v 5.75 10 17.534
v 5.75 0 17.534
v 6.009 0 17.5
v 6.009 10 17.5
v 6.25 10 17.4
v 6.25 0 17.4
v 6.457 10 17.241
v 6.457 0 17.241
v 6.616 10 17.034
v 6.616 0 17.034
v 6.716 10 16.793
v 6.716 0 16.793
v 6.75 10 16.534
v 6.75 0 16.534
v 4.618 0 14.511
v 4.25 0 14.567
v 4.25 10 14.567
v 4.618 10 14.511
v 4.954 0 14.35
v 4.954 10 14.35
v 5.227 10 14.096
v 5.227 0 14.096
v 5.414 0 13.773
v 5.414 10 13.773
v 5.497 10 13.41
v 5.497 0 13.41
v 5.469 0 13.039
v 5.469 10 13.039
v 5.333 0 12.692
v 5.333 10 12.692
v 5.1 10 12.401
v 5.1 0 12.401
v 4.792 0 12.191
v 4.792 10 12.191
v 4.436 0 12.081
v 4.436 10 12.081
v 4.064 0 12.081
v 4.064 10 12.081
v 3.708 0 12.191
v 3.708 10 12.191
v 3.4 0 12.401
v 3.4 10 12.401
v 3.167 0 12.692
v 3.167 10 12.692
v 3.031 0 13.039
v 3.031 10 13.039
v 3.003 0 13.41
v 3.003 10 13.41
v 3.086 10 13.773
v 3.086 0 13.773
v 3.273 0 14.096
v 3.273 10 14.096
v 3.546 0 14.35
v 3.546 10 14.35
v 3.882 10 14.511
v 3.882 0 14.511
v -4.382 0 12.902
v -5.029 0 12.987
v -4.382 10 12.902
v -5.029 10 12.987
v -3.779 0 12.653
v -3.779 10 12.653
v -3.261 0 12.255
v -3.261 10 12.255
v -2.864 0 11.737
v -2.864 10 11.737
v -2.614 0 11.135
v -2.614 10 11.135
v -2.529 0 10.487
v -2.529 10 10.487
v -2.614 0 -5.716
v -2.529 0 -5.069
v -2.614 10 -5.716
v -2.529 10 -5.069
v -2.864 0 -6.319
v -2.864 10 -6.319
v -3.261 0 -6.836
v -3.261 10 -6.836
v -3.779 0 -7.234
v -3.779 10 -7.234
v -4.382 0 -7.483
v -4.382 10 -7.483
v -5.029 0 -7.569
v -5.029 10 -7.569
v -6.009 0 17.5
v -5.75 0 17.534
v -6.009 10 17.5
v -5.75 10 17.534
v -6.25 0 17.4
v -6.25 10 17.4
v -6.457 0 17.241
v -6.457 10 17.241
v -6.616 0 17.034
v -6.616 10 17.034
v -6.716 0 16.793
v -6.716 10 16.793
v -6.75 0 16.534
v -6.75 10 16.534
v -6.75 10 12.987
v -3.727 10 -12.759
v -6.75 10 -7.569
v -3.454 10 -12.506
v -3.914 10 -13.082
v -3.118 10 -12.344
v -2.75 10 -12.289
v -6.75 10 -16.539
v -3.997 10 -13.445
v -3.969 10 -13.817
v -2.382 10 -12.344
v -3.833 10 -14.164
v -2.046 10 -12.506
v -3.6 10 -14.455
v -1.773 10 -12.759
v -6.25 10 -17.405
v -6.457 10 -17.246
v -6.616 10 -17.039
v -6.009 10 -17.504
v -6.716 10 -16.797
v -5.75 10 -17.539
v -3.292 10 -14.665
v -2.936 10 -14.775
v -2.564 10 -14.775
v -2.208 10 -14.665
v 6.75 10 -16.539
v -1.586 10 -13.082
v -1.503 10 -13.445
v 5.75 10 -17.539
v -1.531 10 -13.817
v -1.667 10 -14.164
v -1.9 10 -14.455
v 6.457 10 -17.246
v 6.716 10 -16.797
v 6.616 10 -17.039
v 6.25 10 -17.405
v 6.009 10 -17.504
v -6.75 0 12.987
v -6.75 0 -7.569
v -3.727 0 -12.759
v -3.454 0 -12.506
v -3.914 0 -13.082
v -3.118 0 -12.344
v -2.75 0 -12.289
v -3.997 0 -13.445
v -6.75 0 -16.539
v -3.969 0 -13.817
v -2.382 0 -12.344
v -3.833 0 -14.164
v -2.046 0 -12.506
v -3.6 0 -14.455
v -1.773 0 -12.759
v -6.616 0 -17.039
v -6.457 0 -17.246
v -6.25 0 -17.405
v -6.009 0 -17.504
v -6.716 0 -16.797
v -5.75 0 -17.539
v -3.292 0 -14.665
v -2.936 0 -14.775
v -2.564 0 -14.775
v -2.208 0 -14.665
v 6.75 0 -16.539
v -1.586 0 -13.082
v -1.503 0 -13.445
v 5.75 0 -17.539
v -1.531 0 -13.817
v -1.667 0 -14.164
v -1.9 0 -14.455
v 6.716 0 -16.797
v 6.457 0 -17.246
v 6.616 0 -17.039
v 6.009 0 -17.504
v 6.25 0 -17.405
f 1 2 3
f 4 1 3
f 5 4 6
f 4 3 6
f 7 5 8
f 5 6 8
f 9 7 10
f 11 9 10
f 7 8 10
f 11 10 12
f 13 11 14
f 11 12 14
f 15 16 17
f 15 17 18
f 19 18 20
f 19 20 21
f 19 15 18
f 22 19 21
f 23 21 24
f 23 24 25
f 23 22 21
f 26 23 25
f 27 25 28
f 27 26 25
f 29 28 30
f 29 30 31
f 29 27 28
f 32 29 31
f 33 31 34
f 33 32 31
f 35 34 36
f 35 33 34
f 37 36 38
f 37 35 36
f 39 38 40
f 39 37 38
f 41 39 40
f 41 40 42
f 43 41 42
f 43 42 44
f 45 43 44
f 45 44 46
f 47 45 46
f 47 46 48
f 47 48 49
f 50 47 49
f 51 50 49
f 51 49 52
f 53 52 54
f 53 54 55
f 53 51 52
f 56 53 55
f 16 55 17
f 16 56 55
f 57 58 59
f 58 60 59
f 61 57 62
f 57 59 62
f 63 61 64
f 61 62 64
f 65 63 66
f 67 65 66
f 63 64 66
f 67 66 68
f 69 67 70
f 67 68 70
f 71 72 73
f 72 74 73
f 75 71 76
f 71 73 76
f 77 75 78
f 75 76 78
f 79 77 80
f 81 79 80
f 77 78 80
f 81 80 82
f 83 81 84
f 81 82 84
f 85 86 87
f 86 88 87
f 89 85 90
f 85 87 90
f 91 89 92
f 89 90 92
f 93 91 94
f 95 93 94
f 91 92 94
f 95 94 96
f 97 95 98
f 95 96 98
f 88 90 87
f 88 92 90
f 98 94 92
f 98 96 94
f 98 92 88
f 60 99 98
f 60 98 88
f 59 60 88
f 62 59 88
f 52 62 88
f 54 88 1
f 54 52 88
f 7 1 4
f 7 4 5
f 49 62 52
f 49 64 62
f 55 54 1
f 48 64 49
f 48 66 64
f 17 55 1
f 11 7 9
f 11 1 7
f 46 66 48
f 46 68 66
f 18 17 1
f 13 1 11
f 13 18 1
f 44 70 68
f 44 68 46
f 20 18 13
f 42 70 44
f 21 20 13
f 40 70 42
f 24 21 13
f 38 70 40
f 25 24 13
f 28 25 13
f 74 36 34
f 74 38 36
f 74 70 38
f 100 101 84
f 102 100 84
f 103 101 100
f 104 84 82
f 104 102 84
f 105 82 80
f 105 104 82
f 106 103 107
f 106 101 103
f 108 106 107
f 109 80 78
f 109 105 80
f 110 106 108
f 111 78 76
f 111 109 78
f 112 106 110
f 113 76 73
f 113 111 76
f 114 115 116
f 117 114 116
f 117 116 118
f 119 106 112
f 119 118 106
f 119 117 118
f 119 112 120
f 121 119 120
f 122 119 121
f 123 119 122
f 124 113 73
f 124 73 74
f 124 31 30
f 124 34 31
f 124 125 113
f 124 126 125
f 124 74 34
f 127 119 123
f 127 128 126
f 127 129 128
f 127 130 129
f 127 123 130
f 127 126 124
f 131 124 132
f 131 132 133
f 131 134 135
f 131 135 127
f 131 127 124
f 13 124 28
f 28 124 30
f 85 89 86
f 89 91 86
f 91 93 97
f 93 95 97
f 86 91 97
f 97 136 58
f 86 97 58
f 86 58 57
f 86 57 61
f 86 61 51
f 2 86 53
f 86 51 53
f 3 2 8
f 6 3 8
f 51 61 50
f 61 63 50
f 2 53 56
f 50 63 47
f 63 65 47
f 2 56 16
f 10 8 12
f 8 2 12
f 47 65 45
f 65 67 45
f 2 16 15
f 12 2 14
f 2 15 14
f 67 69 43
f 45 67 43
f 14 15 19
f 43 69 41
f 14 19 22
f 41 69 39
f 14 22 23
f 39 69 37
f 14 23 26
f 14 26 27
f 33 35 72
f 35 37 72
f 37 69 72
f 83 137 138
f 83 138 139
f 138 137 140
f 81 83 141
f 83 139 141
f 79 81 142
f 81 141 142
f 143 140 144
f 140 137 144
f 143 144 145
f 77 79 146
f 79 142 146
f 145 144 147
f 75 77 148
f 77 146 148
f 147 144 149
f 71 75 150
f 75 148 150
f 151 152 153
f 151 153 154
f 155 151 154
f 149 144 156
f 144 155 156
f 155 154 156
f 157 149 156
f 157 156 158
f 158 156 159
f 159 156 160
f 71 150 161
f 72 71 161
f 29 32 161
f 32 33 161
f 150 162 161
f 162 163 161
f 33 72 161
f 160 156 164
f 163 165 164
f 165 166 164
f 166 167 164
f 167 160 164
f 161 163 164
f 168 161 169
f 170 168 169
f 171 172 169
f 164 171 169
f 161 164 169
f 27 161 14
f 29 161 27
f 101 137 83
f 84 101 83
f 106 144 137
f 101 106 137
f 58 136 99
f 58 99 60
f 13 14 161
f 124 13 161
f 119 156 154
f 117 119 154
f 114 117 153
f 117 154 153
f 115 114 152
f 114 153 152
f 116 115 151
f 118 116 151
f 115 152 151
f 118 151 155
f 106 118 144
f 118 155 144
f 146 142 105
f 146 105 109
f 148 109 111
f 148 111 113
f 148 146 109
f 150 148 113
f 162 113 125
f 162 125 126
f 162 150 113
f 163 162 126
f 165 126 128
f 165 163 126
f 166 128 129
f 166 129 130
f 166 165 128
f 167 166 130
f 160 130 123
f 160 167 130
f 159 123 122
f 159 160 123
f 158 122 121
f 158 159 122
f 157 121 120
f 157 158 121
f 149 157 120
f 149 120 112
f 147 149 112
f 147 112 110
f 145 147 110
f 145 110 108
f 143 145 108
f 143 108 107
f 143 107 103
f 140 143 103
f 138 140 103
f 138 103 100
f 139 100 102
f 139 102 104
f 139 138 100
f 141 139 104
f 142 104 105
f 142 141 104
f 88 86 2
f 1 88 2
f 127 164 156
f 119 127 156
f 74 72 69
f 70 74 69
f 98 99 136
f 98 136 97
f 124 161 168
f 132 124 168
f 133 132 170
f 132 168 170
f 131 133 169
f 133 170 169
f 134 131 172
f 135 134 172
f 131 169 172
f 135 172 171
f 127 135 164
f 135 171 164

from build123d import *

# Parameters (mm, degrees)
SKETCH_1_R         = 1.25
EXTRUDE_2_DEPTH    = 10
SKETCH1_W          = 5.221315892
SKETCH1_H          = 20.556
CUT_EXTRUDE1_DEPTH = 10
FILLET1_R          = 1
FILLET2_R          = 2.5


with BuildPart() as part:
    # Эскиз1 → Бобышка-Вытянуть2 (new body)
    with BuildSketch(Plane(origin=(0, 0, 0), x_dir=(1, 0, 0), z_dir=(0, 1, 0))):
        with BuildLine():
            Line((-6.75, -16.533718228), (-6.75, -17.533718228))
            Line((-6.75, -17.533718228), (1.25, -17.533718228))
            Line((1.25, -17.533718228), (5.75, -17.533718228))
            ThreePointArc((5.75, -17.533718228), (6.457106781, -17.240825009), (6.75, -16.533718228))
            Line((6.75, -16.533718228), (6.75, 16.538507887))
            ThreePointArc((6.75, 16.538507887), (6.457106781, 17.245614668), (5.75, 17.538507887))
            Line((5.75, 17.538507887), (-5.75, 17.538507887))
            ThreePointArc((-5.75, 17.538507887), (-6.457106781, 17.245614668), (-6.75, 16.538507887))
            Line((-6.75, 16.538507887), (-6.75, 5.538507887))
            ThreePointArc((-6.75, 5.538507887), (-6.457106781, 4.831401106), (-5.75, 4.538507887))
            Line((-5.75, 4.538507887), (-5.746697715, 4.538507887))
            ThreePointArc((-5.746697715, 4.538507887), (-5.039590934, 4.245614668), (-4.746697715, 3.538507887))
            Line((-4.746697715, 3.538507887), (-4.746697715, -8.461492113))
            ThreePointArc((-4.746697715, -8.461492113), (-5.039590934, -9.168598894), (-5.746697715, -9.461492113))
            Line((-5.746697715, -9.461492113), (-5.75, -9.461492113))
            ThreePointArc((-5.75, -9.461492113), (-6.457106781, -9.754385332), (-6.75, -10.461492113))
            Line((-6.75, -10.461492113), (-6.75, -16.533718228))
        make_face()
        with Locations(Location((-2.75, 13.538507887, 0), (0, 0, 270))):
            Circle(SKETCH_1_R, mode=Mode.SUBTRACT)
        with Locations(Location((4.25, -13.316820051, 0), (0, 0, 270))):
            Circle(SKETCH_1_R, mode=Mode.SUBTRACT)
    extrude(amount=EXTRUDE_2_DEPTH)

    # Sketch1 → Cut-Extrude1 (cut)
    with BuildSketch(Plane.XZ):
        with Locations((-5.139342054, 2.709492113)):
            Rectangle(SKETCH1_W, SKETCH1_H)
    extrude(amount=-CUT_EXTRUDE1_DEPTH, mode=Mode.SUBTRACT)

    # Fillet1
    fillet1_edges = [part.edges().sort_by_distance(p)[0] for p in [
        (-6.75, 5, 17.533718228),
    ]]
    fillet(fillet1_edges, radius=FILLET1_R)

    # Fillet2
    fillet2_edges = [part.edges().sort_by_distance(p)[0] for p in [
        (-2.528684108, 5, -7.568507887),
        (-2.528684108, 5, 12.987492113),
    ]]
    fillet(fillet2_edges, radius=FILLET2_R)


solid = part.part
